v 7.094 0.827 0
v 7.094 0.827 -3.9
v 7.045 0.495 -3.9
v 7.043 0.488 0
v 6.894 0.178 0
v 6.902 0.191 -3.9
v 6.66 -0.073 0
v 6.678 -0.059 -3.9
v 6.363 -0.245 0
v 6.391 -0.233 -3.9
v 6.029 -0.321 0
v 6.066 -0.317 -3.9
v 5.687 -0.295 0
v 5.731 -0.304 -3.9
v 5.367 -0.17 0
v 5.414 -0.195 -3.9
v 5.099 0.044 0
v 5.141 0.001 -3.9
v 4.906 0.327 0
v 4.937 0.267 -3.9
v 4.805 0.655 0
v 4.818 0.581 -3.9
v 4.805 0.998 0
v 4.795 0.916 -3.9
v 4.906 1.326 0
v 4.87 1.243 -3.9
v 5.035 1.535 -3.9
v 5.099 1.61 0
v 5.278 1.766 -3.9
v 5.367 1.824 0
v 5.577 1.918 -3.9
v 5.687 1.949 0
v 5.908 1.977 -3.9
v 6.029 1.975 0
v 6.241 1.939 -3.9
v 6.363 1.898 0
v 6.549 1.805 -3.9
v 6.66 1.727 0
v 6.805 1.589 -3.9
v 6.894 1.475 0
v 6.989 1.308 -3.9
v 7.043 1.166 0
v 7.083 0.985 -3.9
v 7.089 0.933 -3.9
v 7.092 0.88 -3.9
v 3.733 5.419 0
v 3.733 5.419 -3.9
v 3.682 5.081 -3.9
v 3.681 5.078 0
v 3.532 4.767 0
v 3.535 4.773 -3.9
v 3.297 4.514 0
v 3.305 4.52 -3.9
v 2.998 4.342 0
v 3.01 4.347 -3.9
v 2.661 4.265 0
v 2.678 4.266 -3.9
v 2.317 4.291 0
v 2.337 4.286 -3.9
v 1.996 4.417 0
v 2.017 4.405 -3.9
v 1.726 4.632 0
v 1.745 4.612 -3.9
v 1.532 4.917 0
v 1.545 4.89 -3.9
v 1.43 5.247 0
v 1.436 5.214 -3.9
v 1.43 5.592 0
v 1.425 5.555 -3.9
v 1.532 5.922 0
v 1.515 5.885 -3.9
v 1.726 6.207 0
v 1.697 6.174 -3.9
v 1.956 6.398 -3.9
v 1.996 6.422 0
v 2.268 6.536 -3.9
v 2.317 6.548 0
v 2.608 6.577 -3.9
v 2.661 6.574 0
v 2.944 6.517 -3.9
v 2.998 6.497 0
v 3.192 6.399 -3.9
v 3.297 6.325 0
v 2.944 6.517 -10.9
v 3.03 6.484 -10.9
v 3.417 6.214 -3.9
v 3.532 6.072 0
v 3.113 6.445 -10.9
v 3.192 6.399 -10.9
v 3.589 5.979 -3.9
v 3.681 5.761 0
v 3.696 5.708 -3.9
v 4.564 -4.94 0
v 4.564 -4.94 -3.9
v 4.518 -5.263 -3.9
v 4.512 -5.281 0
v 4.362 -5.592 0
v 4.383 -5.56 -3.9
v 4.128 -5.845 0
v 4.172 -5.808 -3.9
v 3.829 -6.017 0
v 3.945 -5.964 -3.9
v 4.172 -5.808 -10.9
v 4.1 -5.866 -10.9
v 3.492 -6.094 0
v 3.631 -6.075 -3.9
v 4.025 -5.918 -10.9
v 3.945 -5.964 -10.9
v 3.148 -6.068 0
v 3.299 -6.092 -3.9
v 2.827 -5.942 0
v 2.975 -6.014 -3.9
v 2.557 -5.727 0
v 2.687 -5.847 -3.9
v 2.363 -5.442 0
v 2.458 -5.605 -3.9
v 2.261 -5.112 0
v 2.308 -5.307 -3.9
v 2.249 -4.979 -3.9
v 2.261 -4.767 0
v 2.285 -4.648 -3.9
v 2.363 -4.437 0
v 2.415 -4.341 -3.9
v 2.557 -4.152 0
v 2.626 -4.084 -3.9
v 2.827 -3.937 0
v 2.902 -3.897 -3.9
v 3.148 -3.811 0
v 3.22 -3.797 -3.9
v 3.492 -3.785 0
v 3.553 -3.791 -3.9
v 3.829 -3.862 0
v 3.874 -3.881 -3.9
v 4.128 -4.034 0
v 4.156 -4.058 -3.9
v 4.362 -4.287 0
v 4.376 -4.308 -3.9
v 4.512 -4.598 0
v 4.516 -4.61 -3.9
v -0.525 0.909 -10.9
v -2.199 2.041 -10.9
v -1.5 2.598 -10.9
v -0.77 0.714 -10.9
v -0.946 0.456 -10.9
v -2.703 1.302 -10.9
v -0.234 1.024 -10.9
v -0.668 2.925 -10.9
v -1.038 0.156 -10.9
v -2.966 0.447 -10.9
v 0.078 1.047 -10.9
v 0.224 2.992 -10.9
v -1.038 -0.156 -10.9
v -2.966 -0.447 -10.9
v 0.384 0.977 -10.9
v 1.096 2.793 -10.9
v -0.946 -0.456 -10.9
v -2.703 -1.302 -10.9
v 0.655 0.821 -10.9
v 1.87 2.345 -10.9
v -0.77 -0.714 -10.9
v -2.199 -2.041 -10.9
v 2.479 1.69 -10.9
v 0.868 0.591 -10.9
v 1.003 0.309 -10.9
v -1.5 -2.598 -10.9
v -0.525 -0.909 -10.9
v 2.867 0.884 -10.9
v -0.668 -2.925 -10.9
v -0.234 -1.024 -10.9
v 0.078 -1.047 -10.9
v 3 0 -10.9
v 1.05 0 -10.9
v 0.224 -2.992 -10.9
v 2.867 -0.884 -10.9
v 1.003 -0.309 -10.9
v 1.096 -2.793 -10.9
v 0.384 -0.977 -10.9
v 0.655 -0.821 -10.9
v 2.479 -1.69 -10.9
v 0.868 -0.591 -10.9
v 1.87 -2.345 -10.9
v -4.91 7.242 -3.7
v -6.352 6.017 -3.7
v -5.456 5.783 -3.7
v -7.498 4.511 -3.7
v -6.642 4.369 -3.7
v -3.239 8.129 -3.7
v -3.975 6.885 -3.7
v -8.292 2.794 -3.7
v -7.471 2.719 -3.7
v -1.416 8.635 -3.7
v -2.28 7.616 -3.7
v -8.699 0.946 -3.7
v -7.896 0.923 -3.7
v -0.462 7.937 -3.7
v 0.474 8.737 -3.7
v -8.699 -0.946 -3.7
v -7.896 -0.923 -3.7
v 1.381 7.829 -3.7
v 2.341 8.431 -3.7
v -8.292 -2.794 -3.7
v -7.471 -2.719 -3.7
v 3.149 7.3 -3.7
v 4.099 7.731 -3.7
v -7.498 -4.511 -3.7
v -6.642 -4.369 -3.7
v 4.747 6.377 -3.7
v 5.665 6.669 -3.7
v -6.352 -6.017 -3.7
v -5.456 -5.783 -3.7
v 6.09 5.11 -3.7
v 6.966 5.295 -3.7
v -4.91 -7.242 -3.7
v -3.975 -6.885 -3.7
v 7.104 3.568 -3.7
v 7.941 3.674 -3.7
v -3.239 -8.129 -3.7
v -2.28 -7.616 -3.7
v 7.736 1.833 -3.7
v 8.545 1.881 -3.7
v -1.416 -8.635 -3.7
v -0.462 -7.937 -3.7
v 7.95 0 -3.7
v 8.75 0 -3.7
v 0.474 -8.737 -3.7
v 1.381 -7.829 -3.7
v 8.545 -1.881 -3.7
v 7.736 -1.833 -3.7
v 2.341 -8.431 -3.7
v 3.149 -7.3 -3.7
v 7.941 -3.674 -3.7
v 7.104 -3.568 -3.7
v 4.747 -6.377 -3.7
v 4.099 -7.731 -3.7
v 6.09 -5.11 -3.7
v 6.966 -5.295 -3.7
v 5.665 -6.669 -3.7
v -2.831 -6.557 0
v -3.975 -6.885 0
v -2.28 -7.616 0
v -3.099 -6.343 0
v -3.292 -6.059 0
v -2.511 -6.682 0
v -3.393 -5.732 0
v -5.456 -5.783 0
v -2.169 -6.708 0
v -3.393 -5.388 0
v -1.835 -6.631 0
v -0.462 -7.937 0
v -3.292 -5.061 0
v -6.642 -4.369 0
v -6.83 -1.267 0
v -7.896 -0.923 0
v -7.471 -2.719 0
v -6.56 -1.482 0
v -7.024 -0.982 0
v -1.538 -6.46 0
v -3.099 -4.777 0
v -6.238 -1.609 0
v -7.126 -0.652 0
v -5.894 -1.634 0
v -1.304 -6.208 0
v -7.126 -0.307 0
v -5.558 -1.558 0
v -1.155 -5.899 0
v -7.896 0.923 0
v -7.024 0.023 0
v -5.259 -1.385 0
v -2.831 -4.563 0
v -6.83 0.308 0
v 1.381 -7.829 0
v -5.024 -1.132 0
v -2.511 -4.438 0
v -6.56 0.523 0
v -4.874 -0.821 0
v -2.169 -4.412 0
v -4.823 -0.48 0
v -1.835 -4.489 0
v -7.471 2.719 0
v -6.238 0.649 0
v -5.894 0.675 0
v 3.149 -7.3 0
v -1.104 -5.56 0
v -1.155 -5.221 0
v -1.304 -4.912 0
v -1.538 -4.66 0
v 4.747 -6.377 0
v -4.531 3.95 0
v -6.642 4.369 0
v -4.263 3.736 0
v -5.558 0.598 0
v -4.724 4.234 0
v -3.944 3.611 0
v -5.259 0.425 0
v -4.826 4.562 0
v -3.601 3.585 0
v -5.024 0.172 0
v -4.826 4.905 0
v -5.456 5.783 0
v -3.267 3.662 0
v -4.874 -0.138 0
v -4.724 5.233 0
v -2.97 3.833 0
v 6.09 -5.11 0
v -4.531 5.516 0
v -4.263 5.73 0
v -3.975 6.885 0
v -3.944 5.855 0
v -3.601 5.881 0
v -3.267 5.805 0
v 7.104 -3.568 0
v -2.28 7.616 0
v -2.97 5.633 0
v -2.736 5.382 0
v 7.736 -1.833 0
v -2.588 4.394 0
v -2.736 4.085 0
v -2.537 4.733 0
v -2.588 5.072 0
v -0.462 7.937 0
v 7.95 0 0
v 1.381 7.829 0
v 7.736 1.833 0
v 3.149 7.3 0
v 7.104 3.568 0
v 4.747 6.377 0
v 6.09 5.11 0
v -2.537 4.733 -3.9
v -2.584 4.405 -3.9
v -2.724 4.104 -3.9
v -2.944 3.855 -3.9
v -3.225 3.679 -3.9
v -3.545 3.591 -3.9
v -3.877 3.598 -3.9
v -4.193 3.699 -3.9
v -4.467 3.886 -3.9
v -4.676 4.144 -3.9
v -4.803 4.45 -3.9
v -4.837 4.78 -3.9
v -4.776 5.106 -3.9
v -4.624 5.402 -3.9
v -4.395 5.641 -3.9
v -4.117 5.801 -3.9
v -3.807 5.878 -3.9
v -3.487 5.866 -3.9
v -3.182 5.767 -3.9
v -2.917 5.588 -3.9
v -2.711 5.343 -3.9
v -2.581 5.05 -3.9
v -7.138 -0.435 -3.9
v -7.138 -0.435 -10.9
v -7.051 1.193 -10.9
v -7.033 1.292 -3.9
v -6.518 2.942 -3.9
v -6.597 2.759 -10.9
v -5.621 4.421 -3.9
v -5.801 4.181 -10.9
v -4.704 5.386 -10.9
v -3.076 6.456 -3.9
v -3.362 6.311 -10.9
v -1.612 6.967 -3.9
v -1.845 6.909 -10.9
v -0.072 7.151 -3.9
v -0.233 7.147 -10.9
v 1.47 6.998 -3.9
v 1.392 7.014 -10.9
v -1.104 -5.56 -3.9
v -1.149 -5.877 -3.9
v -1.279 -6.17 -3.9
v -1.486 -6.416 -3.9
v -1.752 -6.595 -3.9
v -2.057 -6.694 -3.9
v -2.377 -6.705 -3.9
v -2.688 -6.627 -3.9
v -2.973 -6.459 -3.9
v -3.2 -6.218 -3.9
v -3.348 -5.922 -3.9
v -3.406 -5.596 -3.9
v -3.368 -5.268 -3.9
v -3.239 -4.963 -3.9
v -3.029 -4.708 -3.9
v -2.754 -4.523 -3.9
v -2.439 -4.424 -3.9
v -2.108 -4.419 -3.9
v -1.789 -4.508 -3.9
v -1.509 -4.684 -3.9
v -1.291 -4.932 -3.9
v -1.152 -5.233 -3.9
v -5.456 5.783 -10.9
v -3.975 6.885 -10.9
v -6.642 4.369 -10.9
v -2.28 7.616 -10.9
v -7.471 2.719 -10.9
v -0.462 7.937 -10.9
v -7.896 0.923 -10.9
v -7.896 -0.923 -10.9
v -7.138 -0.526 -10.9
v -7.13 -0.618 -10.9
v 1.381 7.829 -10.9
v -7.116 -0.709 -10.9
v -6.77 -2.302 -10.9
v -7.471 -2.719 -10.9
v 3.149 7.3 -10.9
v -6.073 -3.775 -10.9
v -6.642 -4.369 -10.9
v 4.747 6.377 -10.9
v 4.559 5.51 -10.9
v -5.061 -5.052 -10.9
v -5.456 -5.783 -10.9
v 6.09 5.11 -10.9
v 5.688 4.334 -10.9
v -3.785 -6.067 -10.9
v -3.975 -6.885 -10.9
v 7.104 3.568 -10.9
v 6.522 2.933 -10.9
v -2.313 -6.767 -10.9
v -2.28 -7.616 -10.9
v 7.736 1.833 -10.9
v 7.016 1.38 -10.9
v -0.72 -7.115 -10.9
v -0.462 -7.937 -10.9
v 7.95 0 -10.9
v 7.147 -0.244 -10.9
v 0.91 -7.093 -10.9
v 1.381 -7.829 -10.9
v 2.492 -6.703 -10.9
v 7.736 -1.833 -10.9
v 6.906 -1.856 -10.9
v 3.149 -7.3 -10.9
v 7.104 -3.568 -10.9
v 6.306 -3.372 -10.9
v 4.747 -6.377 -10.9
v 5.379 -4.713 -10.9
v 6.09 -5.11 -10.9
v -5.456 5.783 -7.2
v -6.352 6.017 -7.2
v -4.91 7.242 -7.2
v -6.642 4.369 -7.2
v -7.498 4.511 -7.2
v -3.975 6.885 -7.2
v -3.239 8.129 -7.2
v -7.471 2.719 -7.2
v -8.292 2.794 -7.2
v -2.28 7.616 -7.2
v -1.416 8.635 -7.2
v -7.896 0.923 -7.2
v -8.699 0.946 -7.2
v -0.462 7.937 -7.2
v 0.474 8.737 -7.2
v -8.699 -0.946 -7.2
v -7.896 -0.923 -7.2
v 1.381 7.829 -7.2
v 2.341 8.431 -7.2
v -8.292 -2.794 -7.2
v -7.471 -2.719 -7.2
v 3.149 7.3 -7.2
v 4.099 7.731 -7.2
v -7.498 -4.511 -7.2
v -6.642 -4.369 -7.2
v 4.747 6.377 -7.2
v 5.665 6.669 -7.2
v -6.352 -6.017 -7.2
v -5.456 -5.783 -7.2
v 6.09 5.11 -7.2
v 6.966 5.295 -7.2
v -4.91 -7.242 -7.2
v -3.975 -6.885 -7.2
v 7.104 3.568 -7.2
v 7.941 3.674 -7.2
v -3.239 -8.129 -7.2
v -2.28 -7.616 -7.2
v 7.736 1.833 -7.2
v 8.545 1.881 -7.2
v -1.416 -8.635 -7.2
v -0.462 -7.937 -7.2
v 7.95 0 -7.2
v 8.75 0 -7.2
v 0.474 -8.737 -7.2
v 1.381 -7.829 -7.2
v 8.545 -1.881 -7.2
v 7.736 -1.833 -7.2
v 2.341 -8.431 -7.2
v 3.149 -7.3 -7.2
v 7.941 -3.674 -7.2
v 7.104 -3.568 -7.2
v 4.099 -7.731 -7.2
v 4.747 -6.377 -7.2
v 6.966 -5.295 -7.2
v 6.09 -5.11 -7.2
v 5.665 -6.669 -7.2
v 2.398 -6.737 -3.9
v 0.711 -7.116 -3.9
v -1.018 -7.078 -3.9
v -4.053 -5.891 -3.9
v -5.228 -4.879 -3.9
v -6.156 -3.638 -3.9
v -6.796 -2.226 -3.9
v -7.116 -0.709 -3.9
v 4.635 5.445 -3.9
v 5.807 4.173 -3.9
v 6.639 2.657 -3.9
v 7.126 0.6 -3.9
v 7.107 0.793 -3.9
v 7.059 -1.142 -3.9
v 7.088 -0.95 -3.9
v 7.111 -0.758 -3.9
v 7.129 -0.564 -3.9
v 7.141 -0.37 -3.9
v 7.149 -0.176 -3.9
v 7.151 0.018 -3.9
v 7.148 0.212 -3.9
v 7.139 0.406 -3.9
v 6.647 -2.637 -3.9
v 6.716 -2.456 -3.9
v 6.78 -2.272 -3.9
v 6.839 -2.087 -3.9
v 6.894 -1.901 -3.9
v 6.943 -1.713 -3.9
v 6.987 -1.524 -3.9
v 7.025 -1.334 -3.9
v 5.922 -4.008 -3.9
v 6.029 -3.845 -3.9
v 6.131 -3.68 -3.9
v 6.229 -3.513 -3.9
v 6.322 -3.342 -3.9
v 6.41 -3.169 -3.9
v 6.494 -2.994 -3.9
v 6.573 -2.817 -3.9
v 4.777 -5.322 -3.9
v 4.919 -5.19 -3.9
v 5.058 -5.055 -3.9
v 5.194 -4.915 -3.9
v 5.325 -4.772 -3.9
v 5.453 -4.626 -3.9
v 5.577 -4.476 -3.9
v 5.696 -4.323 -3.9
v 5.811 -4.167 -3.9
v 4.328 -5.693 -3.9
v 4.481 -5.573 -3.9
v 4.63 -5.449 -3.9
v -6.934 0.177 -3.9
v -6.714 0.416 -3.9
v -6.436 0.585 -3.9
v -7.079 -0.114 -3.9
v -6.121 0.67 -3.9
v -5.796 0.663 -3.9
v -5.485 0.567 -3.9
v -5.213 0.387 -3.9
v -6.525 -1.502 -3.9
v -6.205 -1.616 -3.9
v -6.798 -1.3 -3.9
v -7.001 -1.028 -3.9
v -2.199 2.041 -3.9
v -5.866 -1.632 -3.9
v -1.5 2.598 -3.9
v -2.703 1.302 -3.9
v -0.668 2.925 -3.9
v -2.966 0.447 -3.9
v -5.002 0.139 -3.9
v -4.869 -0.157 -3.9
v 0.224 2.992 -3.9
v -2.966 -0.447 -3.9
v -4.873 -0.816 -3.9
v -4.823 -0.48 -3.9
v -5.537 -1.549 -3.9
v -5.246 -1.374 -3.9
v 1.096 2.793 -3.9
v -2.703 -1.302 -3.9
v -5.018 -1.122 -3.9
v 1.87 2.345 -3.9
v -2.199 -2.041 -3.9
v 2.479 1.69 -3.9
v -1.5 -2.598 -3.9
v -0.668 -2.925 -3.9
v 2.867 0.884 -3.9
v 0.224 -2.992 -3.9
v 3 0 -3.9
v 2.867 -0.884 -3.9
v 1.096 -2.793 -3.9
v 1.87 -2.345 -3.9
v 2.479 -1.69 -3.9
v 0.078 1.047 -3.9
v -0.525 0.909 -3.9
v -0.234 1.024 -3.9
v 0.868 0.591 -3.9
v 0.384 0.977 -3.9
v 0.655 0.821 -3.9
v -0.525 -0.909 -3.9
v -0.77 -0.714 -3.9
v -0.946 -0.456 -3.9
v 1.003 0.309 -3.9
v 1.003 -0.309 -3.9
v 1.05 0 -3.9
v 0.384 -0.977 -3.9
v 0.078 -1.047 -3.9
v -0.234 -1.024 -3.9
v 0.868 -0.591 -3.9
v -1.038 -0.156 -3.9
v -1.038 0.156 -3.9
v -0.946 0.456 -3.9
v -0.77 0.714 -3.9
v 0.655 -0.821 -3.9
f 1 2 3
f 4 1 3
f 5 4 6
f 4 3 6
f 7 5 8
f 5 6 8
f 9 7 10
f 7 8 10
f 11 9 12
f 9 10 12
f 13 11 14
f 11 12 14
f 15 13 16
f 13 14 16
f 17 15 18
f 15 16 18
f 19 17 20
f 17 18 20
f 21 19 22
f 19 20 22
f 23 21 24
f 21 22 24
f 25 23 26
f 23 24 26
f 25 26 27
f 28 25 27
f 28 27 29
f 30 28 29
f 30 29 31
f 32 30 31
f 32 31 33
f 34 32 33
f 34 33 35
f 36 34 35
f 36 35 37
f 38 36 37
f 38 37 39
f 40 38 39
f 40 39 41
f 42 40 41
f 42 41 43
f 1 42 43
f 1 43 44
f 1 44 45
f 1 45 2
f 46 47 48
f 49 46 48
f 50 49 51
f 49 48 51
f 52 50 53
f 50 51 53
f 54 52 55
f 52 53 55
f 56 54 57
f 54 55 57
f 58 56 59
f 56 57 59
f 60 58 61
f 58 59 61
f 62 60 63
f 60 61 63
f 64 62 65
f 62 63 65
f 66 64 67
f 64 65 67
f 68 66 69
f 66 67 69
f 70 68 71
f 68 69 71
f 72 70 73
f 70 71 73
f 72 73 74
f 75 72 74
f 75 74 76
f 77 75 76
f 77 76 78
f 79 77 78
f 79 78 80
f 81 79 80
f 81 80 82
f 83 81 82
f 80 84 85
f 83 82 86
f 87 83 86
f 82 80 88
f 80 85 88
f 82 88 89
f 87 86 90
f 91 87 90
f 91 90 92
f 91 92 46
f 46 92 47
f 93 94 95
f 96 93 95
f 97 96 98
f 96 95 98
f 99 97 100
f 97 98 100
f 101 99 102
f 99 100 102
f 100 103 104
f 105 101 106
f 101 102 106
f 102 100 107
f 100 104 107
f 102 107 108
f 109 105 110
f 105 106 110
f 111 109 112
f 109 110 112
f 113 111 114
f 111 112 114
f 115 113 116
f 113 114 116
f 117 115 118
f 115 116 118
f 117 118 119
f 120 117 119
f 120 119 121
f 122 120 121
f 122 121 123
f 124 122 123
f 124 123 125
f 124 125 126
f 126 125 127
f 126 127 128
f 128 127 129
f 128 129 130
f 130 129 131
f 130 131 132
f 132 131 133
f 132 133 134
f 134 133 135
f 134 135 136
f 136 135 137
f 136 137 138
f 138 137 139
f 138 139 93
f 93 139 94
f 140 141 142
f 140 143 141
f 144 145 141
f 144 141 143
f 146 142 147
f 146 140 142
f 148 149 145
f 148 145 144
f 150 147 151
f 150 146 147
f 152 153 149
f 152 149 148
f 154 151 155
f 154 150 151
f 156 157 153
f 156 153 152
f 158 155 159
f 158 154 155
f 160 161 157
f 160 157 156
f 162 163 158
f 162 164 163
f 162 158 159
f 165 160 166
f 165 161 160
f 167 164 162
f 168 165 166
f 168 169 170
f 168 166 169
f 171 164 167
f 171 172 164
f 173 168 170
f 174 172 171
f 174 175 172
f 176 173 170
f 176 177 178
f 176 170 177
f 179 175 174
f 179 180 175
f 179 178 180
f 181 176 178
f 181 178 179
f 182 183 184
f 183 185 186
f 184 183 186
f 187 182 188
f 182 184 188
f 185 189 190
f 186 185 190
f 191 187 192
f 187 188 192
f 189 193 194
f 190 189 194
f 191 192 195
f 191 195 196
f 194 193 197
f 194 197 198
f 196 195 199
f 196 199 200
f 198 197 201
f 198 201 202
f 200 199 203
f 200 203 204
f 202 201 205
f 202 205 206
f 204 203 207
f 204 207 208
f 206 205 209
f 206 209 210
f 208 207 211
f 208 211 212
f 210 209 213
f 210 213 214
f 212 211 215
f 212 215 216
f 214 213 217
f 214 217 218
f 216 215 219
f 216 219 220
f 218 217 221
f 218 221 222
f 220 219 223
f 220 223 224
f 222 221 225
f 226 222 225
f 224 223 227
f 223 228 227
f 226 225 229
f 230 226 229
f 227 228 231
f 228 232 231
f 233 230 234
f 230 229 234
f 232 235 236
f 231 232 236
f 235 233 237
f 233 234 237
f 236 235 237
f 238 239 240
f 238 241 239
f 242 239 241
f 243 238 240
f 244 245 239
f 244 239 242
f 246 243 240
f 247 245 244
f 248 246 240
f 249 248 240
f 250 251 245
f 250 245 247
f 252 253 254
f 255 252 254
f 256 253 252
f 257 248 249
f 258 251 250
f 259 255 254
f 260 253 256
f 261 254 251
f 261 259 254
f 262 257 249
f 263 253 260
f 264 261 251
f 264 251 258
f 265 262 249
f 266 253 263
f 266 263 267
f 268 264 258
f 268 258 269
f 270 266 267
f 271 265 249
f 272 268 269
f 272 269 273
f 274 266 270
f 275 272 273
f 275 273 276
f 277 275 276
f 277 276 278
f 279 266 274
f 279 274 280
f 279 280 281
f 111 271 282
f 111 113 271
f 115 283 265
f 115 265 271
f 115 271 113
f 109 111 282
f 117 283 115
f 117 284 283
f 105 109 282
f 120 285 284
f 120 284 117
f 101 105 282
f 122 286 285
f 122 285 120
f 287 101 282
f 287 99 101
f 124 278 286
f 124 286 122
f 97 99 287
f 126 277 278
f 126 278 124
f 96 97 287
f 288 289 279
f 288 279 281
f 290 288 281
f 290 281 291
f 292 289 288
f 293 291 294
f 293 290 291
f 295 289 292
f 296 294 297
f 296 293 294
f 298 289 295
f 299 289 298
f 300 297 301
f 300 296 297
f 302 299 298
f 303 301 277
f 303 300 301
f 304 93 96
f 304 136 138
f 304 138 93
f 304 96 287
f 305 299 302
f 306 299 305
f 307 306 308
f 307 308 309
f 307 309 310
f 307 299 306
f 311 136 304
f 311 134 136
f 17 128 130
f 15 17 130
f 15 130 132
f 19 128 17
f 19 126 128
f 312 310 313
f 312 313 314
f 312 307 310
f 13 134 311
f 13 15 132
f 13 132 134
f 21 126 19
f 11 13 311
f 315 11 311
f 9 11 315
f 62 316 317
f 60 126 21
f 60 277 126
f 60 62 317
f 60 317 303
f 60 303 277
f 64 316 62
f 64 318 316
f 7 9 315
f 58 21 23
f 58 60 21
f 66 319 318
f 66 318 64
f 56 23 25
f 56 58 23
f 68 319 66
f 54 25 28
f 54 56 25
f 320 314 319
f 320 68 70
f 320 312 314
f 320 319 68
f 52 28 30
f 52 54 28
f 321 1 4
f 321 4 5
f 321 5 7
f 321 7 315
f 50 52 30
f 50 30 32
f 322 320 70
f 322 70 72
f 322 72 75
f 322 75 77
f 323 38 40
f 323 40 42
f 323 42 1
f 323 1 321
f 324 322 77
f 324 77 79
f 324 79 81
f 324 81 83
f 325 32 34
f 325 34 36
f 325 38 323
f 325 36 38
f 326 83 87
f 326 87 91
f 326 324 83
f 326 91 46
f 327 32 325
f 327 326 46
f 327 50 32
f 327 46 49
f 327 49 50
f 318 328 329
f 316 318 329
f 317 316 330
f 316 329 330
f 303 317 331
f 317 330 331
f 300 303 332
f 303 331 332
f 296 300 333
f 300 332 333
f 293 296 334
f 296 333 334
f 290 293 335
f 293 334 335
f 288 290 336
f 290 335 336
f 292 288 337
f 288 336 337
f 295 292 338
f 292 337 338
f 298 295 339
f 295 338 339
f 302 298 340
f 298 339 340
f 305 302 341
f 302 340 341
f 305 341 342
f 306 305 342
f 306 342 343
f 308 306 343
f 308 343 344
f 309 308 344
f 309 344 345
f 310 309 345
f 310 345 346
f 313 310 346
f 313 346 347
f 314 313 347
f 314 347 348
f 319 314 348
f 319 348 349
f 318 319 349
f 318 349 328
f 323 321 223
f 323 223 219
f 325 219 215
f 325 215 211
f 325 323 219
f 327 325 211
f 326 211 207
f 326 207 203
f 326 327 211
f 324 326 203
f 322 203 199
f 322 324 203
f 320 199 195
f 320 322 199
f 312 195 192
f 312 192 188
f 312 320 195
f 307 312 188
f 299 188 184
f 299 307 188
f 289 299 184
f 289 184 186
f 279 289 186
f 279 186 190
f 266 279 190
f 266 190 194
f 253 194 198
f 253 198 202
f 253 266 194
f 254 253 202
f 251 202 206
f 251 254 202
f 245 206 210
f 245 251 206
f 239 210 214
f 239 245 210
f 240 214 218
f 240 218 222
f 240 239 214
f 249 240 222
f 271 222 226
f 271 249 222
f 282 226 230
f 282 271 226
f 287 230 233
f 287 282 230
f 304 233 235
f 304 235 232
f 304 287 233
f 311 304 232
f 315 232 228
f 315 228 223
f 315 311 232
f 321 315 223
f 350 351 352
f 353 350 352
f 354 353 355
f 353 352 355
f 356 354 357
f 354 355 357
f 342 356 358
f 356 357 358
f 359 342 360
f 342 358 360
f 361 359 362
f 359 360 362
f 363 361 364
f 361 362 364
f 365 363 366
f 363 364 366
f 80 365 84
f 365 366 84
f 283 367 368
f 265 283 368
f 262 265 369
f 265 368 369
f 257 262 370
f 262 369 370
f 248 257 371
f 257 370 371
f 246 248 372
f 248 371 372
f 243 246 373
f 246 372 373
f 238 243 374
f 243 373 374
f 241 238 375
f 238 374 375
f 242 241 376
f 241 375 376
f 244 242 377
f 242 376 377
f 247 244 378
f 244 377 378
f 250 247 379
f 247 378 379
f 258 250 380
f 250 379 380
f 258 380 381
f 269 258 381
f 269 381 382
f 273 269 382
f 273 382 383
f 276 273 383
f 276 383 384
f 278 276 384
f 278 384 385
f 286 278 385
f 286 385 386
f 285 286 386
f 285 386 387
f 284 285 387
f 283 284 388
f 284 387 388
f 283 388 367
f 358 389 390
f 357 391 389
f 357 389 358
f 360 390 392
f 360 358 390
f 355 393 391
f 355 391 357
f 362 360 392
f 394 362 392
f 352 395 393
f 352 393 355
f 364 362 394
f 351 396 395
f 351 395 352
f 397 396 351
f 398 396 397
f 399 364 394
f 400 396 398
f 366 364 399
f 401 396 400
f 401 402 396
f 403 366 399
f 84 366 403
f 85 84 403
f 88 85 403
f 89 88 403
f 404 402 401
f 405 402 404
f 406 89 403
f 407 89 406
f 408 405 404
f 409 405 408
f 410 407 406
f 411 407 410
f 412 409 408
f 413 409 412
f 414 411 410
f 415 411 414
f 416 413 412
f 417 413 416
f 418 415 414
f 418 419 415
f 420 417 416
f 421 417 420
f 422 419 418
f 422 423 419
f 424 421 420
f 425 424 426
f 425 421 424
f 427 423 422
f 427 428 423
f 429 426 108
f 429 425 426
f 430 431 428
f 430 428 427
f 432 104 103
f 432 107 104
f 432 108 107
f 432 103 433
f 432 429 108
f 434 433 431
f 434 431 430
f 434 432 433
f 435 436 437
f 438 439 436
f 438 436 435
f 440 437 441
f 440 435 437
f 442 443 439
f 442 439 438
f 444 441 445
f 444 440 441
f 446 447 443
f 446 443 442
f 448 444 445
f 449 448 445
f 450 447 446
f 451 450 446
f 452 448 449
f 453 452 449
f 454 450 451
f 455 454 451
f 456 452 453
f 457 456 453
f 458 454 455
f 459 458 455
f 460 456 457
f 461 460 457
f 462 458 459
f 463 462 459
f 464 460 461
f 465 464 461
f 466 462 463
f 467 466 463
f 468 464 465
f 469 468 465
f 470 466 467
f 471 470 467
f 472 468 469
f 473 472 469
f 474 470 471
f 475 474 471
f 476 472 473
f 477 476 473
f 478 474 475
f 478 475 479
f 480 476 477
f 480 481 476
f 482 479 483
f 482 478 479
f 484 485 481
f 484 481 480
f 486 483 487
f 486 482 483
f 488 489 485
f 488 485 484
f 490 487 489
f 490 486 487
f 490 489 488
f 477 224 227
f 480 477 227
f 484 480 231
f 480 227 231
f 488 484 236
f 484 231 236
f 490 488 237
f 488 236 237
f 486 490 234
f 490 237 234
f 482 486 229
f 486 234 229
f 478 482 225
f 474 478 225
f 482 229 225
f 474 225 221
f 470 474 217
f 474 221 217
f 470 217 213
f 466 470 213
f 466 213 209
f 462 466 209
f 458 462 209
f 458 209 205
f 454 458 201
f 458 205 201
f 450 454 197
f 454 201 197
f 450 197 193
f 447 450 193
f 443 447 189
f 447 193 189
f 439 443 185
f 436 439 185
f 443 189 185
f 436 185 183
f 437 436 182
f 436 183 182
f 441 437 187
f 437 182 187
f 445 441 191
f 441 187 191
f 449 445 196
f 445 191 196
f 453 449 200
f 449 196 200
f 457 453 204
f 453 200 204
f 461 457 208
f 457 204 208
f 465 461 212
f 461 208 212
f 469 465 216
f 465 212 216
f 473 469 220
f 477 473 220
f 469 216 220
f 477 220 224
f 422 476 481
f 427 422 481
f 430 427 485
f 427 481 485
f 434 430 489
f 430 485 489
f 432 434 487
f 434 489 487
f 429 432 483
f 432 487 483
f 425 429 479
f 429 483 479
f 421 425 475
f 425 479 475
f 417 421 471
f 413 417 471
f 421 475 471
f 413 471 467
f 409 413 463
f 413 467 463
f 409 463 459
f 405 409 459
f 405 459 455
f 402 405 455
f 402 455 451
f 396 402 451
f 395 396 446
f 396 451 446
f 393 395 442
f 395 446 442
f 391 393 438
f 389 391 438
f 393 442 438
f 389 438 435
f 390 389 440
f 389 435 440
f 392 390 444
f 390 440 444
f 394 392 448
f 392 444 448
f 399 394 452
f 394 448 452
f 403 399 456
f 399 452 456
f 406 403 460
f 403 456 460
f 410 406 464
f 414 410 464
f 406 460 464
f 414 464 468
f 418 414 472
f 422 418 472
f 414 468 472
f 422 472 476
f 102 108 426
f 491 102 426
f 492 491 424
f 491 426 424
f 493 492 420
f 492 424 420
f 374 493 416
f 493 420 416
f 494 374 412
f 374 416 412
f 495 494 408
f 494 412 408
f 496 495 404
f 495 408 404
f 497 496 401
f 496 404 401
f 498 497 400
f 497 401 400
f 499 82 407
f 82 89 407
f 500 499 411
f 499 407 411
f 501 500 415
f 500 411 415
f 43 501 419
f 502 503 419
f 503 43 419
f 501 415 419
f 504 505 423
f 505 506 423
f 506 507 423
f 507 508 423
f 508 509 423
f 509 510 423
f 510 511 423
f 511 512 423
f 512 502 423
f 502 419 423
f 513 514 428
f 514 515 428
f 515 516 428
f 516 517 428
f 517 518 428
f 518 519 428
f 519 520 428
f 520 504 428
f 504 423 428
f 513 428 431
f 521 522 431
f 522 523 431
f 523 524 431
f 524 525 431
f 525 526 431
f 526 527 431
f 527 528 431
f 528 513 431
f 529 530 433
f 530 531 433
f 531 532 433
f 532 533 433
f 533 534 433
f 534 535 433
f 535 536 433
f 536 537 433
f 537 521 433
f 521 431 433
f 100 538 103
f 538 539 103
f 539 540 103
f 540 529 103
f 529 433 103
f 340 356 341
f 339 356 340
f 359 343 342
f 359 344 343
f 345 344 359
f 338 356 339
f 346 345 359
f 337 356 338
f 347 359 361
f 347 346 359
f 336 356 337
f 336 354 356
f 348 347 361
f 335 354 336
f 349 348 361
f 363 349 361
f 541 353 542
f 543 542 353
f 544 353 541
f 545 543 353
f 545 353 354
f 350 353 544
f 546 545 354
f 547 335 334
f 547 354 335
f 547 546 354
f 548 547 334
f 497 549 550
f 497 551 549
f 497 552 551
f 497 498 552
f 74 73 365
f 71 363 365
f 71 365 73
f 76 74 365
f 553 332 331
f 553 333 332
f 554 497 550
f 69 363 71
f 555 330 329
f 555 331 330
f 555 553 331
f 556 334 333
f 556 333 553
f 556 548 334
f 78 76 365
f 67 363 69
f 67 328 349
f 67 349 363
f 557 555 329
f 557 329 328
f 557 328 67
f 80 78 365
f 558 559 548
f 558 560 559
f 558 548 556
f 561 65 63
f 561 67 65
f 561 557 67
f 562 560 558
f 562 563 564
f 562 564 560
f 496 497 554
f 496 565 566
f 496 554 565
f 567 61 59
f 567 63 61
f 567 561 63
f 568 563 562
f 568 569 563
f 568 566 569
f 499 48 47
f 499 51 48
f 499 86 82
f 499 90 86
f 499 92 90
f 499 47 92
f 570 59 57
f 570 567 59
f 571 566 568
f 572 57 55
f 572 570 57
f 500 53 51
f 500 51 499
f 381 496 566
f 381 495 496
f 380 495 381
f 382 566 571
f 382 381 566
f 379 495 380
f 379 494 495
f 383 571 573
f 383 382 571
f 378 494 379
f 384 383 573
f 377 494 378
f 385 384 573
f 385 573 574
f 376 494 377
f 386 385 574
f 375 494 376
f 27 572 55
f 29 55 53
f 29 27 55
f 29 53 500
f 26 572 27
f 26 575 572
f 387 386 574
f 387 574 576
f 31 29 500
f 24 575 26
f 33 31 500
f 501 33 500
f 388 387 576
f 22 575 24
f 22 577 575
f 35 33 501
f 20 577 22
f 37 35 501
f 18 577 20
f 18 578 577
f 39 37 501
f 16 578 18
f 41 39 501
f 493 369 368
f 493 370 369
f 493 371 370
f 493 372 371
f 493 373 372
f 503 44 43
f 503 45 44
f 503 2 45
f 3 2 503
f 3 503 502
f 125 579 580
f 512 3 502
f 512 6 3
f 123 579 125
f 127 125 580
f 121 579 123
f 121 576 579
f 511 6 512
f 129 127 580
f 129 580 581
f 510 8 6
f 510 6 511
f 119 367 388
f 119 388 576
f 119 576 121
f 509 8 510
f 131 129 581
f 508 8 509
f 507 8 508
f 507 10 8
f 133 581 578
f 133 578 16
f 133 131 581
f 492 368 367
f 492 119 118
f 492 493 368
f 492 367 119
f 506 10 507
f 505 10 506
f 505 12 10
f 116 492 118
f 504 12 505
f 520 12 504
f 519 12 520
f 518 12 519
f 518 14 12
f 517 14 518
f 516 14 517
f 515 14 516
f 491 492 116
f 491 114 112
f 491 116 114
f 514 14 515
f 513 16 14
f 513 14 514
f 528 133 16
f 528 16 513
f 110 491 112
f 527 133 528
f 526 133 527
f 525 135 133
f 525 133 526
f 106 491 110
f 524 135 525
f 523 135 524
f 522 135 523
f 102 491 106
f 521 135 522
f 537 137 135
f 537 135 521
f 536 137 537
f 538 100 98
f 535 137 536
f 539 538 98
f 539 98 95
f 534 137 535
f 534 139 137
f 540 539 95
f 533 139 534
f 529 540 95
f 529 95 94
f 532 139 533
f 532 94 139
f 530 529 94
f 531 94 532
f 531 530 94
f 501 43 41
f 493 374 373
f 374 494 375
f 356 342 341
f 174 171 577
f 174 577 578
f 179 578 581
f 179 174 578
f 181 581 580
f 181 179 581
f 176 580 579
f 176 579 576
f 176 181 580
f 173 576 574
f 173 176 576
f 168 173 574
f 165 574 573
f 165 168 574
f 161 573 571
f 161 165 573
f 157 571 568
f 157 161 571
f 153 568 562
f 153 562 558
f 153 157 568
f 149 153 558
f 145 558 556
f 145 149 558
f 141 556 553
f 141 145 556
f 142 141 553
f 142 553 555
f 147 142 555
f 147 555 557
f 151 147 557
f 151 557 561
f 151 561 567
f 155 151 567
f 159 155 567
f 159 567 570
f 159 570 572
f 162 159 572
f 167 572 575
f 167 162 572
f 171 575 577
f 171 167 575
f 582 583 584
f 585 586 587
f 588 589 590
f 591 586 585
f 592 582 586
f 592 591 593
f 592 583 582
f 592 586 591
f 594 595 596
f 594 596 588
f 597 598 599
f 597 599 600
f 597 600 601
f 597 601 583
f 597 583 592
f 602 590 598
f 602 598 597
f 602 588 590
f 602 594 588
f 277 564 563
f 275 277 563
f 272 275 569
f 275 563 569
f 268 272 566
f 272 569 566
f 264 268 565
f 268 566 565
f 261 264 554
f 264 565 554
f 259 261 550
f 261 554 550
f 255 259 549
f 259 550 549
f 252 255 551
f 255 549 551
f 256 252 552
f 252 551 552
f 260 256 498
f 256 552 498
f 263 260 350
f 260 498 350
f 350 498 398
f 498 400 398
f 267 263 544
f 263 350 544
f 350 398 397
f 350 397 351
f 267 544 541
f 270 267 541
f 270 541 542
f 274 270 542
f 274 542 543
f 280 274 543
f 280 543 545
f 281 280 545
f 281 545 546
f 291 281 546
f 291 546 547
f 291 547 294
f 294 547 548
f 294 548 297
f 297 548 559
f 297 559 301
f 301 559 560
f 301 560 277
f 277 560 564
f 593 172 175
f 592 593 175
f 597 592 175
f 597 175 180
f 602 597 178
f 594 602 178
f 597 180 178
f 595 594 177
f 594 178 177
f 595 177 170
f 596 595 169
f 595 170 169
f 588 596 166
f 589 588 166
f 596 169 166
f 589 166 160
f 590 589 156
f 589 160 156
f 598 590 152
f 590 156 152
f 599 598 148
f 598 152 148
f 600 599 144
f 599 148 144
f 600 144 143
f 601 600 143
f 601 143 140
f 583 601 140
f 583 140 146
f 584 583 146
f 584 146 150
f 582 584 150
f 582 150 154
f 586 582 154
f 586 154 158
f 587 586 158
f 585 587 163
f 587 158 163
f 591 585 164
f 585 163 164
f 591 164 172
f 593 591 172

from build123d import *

# Parameters (mm, degrees)
F0_R      = 7.95
F1_DEPTH  = 3.7
F2_R      = 8.75
F3_DEPTH  = 3.5
F4_R      = 7.95
F5_DEPTH  = 3.7
F6_R      = 1.157817429
F7_DEPTH  = 25
F8_R      = 1.150952134
F9_DEPTH  = 25
F10_R     = 7.150952134
F10_R_2   = 3
F10_R_3   = 1.05
F11_DEPTH = 7


with BuildPart() as f1:
    # F0 (on Top) → F1 (new body)
    with BuildSketch(Plane.XY):
        Circle(F0_R)
    extrude(amount=-F1_DEPTH)

    # F2 (on face) → F3 (join)
    with BuildSketch(Plane(origin=(0, 0, -3.7), x_dir=(1, 0, 0), z_dir=(0, 0, -1))):
        Circle(F2_R)
    extrude(amount=F3_DEPTH)

    # F4 (on face) → F5 (join)
    with BuildSketch(Plane(origin=(0, 0, -7.2), x_dir=(1, 0, 0), z_dir=(0, 0, -1))):
        Circle(F4_R)
    extrude(amount=F5_DEPTH)

    # F6 (on face) → F7 (cut)
    with BuildSketch(Plane(origin=(0, 0, -10.9), x_dir=(1, 0, 0), z_dir=(0, 0, -1))):
        with Locations((-5.9807905132, 0.4797341322)):
            Circle(F6_R)
        with Locations((2.5749333111, -5.4193835852)):
            Circle(F6_R)
        with Locations((3.4058572021, 4.939649453)):
            Circle(F6_R)
    extrude(amount=-F7_DEPTH, mode=Mode.SUBTRACT)

    # F8 (on face) → F9 (cut)
    with BuildSketch(Plane(origin=(0, 0, -10.9), x_dir=(1, 0, 0), z_dir=(0, 0, -1))):
        with Locations((-2.2553007404, 5.56000167)):
            Circle(F8_R)
        with Locations((5.9427530615, -0.8268531007)):
            Circle(F8_R)
        with Locations((-3.6874523211, -4.7331485693)):
            Circle(F8_R)
    extrude(amount=-F9_DEPTH, mode=Mode.SUBTRACT)

    # F10 (on face) → F11 (cut)
    with BuildSketch(Plane(origin=(0, 0, -10.9), x_dir=(1, 0, 0), z_dir=(0, 0, -1))):
        Circle(F10_R)
        Circle(F10_R_2, mode=Mode.SUBTRACT)
        Circle(F10_R_3)
    extrude(amount=-F11_DEPTH, mode=Mode.SUBTRACT)


solid = f1.part
